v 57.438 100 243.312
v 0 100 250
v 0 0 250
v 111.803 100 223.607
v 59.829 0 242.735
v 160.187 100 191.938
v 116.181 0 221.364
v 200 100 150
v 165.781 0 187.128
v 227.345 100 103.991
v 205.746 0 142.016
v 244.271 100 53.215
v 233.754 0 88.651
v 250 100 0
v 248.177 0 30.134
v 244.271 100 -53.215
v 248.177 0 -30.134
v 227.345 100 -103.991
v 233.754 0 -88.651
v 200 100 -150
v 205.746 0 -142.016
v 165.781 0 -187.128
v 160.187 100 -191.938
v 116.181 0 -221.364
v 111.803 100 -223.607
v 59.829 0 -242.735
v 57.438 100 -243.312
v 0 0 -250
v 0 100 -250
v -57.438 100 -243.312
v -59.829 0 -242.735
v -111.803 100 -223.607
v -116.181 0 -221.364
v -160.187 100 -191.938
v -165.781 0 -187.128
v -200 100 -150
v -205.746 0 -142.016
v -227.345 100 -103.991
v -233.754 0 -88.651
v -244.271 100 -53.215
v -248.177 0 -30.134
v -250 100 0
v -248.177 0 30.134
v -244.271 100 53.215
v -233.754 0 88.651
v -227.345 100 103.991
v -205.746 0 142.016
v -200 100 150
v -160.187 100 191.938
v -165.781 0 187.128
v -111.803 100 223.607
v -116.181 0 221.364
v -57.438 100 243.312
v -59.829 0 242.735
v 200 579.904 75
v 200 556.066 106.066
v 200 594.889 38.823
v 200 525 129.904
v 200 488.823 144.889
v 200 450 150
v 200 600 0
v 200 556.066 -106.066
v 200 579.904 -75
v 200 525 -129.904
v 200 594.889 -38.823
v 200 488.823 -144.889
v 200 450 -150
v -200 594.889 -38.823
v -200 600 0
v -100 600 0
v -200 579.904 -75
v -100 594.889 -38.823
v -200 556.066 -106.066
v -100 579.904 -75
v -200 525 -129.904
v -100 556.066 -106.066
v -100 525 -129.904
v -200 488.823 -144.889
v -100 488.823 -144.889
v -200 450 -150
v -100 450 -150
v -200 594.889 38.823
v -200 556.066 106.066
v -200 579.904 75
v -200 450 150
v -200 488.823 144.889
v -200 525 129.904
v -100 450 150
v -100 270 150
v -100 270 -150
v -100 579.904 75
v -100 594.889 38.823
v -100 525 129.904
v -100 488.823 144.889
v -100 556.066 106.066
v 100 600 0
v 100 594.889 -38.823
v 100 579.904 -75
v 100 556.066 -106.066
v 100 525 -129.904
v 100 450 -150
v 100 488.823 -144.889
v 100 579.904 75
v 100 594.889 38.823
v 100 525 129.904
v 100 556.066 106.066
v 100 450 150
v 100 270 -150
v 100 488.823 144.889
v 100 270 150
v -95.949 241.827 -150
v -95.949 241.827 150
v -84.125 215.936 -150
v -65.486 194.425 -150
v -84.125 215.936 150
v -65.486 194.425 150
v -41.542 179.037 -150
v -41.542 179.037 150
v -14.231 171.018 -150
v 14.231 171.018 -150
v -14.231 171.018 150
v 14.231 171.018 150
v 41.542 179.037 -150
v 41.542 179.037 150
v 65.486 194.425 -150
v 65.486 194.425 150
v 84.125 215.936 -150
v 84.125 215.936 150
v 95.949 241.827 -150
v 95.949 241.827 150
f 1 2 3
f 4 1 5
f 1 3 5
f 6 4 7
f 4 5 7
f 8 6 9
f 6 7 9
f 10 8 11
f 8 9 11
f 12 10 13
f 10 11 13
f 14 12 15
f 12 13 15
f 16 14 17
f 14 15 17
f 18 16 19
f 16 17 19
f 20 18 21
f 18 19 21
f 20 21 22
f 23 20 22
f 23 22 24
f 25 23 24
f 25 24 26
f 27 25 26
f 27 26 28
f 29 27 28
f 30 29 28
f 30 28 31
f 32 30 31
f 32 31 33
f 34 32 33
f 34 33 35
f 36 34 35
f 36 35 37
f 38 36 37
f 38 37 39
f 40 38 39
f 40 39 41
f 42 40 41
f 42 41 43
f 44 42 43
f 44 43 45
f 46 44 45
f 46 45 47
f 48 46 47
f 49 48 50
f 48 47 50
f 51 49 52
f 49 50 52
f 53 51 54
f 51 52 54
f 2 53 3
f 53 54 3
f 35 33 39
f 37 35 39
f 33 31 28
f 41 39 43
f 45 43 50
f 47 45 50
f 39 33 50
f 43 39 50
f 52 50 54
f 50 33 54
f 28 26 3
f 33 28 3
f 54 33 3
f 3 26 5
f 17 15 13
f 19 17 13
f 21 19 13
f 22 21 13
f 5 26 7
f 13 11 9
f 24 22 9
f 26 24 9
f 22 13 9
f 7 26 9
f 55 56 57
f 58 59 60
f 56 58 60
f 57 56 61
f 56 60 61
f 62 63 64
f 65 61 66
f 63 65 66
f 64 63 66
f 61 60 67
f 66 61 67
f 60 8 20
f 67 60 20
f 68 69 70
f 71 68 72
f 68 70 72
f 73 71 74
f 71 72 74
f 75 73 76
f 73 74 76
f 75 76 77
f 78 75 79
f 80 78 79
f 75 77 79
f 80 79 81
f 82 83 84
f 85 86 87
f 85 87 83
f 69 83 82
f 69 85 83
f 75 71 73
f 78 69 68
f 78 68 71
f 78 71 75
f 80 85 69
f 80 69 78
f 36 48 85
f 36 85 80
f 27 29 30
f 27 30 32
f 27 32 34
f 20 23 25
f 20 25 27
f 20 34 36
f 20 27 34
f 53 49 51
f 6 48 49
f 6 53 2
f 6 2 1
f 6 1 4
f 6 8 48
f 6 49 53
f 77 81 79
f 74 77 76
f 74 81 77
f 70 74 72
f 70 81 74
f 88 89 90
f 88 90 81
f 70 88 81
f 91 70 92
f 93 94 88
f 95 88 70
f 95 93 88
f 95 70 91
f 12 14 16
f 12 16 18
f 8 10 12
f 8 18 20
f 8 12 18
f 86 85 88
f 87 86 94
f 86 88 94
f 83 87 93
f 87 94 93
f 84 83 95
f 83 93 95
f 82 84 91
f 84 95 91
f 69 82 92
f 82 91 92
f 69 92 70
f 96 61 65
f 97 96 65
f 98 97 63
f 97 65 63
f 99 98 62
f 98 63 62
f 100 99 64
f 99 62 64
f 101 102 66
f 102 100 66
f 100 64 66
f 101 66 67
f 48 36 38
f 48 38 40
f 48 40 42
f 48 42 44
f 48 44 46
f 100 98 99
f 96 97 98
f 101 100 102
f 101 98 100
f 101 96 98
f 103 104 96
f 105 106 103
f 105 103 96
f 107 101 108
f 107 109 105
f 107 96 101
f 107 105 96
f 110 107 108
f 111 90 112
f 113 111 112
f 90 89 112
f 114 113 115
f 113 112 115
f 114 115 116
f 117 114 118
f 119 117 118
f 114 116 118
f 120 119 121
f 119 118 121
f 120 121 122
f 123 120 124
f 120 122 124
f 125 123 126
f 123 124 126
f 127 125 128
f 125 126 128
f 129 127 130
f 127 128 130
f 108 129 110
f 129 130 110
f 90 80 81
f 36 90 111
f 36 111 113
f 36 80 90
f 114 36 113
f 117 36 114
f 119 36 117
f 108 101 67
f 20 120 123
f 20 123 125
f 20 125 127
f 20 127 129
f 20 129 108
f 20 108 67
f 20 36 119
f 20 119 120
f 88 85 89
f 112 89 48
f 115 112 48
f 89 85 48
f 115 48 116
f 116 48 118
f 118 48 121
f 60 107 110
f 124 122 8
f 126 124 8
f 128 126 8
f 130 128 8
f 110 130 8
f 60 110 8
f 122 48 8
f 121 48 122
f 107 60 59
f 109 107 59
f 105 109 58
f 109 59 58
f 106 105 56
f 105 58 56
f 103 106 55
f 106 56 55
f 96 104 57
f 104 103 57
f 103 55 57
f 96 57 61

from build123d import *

# Parameters (mm, degrees)
SKETCH_1_R          = 250
EXTRUDE_1_DEPTH     = 100
SKETCH_2_W          = 400
SKETCH_2_H          = 300
EXTRUDE_2_DEPTH     = 500
FILLET_1_R          = 150
FILLET_2_R          = 150
CUT_EXTRUDE_1_DEPTH = 250
SKETCH_4_R          = 100
CUT_EXTRUDE_2_DEPTH = 250


with BuildPart() as part:
    # 草图1 → 凸台-拉伸1 (new body)
    with BuildSketch(Plane(origin=(0, 0, 0), x_dir=(1, 0, 0), z_dir=(0, 1, 0))):
        with Locations(Location((0, 0, 0), (0, 0, 270))):
            Circle(SKETCH_1_R)
    extrude(amount=EXTRUDE_1_DEPTH)

    # 草图2 → 凸台-拉伸2 (add)
    with BuildSketch(Plane(origin=(0, 100, 0), x_dir=(1, 0, 0), z_dir=(0, 1, 0))):
        Rectangle(SKETCH_2_W, SKETCH_2_H)
    extrude(amount=EXTRUDE_2_DEPTH)

    # 圆角1
    fillet_1_edges = [part.edges().sort_by_distance(p)[0] for p in [
        (0, 600, 150),
    ]]
    fillet(fillet_1_edges, radius=FILLET_1_R)

    # 圆角2
    fillet_2_edges = [part.edges().sort_by_distance(p)[0] for p in [
        (0, 600, -150),
    ]]
    fillet(fillet_2_edges, radius=FILLET_2_R - 0.0001)  # a hair under: the kernel refuses the full size

    # 草图3 → 切除-拉伸1 (cut, symmetric)
    with BuildSketch(Plane.XY):
        Polygon((0, 600), (100, 600), (100, 270), (0, 270), (-100, 270), (-100, 600), align=None)
    extrude(amount=CUT_EXTRUDE_1_DEPTH, both=True, mode=Mode.SUBTRACT)

    # 草图4 → 切除-拉伸2 (cut, symmetric)
    with BuildSketch(Plane.XY):
        with Locations((0, 270)):
            Circle(SKETCH_4_R)
    extrude(amount=CUT_EXTRUDE_2_DEPTH, both=True, mode=Mode.SUBTRACT)


solid = part.part
